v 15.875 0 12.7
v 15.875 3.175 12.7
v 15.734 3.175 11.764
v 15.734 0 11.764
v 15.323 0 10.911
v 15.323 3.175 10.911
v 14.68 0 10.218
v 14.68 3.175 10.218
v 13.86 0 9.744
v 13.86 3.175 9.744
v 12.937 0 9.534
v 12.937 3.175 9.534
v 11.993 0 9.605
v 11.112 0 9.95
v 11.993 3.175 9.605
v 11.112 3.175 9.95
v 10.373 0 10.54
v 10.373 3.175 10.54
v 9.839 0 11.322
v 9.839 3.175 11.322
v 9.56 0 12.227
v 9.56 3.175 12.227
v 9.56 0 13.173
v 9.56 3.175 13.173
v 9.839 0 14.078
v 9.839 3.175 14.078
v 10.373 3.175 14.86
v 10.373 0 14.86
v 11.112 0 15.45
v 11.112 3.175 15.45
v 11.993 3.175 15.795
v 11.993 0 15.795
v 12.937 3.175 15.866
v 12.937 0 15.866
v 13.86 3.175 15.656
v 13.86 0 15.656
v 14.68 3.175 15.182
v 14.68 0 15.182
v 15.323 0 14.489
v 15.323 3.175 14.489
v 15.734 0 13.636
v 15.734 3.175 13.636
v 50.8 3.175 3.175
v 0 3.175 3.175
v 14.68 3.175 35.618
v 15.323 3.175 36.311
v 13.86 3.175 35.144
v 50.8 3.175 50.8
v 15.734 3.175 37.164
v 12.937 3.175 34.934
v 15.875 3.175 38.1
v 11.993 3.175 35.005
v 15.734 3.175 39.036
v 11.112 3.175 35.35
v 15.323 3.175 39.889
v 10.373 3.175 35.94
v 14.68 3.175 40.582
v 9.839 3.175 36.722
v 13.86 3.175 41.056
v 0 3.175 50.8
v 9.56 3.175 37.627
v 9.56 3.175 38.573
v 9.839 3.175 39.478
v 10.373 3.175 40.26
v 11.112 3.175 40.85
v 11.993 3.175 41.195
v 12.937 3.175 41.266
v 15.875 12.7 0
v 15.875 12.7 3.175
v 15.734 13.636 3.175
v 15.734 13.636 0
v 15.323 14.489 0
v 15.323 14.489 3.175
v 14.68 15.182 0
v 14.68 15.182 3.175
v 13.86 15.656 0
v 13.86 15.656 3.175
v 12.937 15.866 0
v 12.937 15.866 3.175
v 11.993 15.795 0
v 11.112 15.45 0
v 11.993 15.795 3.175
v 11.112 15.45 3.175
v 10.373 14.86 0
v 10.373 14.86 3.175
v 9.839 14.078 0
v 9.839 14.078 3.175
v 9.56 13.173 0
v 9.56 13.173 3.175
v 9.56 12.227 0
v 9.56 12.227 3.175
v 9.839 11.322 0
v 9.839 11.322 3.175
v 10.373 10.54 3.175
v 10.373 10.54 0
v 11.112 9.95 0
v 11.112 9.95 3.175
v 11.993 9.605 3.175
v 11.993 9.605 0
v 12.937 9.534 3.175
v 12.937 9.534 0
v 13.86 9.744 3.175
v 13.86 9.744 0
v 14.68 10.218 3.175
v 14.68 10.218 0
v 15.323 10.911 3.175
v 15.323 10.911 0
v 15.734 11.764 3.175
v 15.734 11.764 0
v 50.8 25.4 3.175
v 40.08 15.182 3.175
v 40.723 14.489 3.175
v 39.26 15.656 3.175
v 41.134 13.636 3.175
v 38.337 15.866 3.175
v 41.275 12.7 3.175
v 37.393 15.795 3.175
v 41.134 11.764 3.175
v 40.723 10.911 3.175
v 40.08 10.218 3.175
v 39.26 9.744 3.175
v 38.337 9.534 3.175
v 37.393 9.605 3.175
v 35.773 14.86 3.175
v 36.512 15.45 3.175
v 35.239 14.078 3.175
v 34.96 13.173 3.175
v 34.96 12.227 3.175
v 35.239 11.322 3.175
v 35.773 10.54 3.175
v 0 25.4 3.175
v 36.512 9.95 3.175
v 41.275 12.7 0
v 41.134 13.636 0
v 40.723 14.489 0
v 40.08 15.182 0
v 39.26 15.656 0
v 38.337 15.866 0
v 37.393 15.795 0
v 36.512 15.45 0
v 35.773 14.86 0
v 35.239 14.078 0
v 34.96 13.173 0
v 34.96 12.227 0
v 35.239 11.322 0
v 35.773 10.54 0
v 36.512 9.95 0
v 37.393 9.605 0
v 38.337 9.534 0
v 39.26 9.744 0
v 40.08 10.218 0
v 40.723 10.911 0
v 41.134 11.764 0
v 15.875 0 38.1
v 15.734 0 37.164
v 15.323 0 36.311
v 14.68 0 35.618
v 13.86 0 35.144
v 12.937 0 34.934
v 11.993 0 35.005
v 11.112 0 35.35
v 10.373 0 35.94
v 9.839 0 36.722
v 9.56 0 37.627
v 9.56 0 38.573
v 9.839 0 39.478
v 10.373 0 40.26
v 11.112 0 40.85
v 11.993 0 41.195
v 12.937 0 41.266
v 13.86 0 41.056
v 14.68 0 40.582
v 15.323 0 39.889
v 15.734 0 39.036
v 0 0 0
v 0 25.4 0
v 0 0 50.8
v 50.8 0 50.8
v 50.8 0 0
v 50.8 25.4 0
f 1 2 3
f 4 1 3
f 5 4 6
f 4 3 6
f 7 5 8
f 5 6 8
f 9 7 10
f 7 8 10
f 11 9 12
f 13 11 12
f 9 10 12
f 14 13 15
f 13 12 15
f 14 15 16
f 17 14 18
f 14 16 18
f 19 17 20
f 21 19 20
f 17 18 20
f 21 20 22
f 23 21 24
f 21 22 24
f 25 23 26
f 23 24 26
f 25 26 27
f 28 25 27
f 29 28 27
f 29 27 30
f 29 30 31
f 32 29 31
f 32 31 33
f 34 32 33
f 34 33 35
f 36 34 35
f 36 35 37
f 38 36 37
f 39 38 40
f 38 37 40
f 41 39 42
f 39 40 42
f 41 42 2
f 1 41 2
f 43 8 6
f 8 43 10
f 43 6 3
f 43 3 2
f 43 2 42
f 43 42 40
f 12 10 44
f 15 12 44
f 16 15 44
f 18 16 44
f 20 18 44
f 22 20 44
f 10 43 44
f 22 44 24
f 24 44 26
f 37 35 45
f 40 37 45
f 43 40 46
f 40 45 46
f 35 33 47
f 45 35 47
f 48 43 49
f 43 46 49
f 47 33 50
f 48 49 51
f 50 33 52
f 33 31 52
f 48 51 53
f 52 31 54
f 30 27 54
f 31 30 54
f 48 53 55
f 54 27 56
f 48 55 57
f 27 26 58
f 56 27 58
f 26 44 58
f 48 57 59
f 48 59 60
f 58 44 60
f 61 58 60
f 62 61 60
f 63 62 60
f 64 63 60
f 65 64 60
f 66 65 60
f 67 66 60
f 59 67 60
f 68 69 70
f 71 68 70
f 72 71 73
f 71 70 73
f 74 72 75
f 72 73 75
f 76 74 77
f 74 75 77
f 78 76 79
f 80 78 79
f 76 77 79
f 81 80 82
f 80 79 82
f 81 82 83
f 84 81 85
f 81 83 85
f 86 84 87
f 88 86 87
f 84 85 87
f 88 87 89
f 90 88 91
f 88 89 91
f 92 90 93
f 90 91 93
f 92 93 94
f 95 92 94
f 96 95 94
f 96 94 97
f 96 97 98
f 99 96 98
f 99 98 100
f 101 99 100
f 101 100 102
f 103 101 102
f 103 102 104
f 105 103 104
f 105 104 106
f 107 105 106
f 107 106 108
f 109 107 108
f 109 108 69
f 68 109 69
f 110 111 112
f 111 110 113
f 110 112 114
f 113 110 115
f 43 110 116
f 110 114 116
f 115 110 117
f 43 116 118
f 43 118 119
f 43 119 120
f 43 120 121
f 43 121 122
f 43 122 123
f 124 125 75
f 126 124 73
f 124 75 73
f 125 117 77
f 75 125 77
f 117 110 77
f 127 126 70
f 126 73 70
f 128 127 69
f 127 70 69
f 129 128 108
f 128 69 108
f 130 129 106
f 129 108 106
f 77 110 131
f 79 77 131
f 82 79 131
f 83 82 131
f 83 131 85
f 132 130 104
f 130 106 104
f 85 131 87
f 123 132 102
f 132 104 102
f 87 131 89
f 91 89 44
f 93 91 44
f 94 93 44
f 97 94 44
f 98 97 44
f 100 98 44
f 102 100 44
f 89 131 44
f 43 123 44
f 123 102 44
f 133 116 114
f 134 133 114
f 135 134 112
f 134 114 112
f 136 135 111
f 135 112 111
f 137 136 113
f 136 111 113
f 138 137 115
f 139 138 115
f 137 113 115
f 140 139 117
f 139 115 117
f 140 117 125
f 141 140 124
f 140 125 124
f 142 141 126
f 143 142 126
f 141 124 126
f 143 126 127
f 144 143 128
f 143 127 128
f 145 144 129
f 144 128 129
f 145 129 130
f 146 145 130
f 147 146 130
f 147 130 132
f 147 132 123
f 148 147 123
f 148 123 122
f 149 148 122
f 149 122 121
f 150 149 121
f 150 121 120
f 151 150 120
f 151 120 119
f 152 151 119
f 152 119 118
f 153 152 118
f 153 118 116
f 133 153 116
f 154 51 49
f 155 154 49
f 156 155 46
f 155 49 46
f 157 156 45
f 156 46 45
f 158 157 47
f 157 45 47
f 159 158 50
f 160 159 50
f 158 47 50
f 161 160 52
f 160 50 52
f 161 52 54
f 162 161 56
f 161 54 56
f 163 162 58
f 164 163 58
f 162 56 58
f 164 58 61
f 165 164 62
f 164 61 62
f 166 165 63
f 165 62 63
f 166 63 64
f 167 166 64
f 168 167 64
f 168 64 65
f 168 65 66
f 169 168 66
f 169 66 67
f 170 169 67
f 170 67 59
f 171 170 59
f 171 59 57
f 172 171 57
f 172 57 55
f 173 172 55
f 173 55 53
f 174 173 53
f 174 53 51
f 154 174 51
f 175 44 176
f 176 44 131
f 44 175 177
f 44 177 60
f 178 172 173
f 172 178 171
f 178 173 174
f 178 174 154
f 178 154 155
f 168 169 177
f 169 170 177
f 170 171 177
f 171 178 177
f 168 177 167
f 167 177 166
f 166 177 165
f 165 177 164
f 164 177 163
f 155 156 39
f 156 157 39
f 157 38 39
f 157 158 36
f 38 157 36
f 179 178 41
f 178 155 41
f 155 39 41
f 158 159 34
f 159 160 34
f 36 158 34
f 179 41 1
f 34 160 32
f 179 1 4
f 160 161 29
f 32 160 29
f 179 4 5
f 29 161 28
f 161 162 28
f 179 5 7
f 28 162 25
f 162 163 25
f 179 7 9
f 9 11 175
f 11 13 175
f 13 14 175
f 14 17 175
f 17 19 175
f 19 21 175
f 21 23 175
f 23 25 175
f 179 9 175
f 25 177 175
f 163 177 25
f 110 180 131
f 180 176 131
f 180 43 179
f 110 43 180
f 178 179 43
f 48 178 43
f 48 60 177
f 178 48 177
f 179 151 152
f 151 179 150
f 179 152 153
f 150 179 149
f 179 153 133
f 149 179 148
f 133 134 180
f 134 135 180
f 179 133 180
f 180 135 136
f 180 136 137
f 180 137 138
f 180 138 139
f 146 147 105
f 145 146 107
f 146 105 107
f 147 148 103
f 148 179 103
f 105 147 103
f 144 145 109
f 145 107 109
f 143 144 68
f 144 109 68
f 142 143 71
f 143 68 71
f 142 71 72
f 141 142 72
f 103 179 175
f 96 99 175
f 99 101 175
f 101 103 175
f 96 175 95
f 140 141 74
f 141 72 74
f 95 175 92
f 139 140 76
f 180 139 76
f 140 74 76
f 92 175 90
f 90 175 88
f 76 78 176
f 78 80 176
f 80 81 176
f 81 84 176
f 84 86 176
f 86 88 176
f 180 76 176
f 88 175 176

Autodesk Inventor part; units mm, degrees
ref_plane "YZ Plane" through (0, 0, 0) normal (1, 0, 0) x (0, 1, 0)
ref_plane "XZ Plane" through (0, 0, 0) normal (0, 1, 0) x (-1, 0, 0)
ref_plane "XY Plane" through (0, 0, 0) normal (0, 0, 1) x (1, 0, 0)
sketch "Sketch1" plane through (0, 0, 0) normal (1, 0, 0) x (0, 1, 0)
  line L0 (0, 0) -> (25.4, 0)
  line L1 (25.4, 0) -> (25.4, 3.175)
  line L2 (25.4, 3.175) -> (3.175, 3.175)
  line L3 (3.175, 3.175) -> (3.175, 50.8)
  line L4 (3.175, 50.8) -> (0, 50.8)
  line L5 (0, 50.8) -> (0, 0)
  dimension "d0" = 25.4
  dimension "d1" = 3.175
  dimension "d2" = 22.225
  dimension "d3" = 47.625
extrude "Extrusion1" add sketch "Sketch1" along normal blind 50.8
sketch "Sketch2" plane through (0, 3.175, 3.175) normal (0, 0, 1) x (1, 0, 0)
  circle A0 centre (12.7, 9.525) radius 3.175
  circle A1 centre (38.1, 9.525) radius 3.175
  line L0 (0, 22.225) -> (50.8, 22.225) projected
  line L1 (50.8, 22.225) -> (50.8, 0) projected
  line L2 (0, 22.225) -> (0, 0) projected
  point P0 (0, -3.175)
  dimension "d6" = 6.35
  dimension "d7" = 12.7
  dimension "d8" = 12.7
  dimension "d9" = 12.7
  dimension "d10" = 12.7
extrude "Extrusion2" cut sketch "Sketch2" against normal blind 3.175
sketch "Sketch3" plane through (0, 3.175, 50.8) normal (0, 1, 0) x (1, 0, 0)
  circle A0 centre (12.7, 12.7) radius 3.175
  circle A1 centre (12.7, 38.1) radius 3.175
  line L0 (0, 0) -> (50.8, 0) projected
  line L1 (0, 47.625) -> (0, 0) projected
  point P0 (0, 50.8)
  dimension "d13" = 6.35
  dimension "d14" = 6.35
  dimension "d15" = 12.7
  dimension "d16" = 12.7
  dimension "d17" = 12.7
  dimension "d18" = 38.1
extrude "Extrusion3" cut sketch "Sketch3" against normal blind 3.175
properties part number "angle gusset"
